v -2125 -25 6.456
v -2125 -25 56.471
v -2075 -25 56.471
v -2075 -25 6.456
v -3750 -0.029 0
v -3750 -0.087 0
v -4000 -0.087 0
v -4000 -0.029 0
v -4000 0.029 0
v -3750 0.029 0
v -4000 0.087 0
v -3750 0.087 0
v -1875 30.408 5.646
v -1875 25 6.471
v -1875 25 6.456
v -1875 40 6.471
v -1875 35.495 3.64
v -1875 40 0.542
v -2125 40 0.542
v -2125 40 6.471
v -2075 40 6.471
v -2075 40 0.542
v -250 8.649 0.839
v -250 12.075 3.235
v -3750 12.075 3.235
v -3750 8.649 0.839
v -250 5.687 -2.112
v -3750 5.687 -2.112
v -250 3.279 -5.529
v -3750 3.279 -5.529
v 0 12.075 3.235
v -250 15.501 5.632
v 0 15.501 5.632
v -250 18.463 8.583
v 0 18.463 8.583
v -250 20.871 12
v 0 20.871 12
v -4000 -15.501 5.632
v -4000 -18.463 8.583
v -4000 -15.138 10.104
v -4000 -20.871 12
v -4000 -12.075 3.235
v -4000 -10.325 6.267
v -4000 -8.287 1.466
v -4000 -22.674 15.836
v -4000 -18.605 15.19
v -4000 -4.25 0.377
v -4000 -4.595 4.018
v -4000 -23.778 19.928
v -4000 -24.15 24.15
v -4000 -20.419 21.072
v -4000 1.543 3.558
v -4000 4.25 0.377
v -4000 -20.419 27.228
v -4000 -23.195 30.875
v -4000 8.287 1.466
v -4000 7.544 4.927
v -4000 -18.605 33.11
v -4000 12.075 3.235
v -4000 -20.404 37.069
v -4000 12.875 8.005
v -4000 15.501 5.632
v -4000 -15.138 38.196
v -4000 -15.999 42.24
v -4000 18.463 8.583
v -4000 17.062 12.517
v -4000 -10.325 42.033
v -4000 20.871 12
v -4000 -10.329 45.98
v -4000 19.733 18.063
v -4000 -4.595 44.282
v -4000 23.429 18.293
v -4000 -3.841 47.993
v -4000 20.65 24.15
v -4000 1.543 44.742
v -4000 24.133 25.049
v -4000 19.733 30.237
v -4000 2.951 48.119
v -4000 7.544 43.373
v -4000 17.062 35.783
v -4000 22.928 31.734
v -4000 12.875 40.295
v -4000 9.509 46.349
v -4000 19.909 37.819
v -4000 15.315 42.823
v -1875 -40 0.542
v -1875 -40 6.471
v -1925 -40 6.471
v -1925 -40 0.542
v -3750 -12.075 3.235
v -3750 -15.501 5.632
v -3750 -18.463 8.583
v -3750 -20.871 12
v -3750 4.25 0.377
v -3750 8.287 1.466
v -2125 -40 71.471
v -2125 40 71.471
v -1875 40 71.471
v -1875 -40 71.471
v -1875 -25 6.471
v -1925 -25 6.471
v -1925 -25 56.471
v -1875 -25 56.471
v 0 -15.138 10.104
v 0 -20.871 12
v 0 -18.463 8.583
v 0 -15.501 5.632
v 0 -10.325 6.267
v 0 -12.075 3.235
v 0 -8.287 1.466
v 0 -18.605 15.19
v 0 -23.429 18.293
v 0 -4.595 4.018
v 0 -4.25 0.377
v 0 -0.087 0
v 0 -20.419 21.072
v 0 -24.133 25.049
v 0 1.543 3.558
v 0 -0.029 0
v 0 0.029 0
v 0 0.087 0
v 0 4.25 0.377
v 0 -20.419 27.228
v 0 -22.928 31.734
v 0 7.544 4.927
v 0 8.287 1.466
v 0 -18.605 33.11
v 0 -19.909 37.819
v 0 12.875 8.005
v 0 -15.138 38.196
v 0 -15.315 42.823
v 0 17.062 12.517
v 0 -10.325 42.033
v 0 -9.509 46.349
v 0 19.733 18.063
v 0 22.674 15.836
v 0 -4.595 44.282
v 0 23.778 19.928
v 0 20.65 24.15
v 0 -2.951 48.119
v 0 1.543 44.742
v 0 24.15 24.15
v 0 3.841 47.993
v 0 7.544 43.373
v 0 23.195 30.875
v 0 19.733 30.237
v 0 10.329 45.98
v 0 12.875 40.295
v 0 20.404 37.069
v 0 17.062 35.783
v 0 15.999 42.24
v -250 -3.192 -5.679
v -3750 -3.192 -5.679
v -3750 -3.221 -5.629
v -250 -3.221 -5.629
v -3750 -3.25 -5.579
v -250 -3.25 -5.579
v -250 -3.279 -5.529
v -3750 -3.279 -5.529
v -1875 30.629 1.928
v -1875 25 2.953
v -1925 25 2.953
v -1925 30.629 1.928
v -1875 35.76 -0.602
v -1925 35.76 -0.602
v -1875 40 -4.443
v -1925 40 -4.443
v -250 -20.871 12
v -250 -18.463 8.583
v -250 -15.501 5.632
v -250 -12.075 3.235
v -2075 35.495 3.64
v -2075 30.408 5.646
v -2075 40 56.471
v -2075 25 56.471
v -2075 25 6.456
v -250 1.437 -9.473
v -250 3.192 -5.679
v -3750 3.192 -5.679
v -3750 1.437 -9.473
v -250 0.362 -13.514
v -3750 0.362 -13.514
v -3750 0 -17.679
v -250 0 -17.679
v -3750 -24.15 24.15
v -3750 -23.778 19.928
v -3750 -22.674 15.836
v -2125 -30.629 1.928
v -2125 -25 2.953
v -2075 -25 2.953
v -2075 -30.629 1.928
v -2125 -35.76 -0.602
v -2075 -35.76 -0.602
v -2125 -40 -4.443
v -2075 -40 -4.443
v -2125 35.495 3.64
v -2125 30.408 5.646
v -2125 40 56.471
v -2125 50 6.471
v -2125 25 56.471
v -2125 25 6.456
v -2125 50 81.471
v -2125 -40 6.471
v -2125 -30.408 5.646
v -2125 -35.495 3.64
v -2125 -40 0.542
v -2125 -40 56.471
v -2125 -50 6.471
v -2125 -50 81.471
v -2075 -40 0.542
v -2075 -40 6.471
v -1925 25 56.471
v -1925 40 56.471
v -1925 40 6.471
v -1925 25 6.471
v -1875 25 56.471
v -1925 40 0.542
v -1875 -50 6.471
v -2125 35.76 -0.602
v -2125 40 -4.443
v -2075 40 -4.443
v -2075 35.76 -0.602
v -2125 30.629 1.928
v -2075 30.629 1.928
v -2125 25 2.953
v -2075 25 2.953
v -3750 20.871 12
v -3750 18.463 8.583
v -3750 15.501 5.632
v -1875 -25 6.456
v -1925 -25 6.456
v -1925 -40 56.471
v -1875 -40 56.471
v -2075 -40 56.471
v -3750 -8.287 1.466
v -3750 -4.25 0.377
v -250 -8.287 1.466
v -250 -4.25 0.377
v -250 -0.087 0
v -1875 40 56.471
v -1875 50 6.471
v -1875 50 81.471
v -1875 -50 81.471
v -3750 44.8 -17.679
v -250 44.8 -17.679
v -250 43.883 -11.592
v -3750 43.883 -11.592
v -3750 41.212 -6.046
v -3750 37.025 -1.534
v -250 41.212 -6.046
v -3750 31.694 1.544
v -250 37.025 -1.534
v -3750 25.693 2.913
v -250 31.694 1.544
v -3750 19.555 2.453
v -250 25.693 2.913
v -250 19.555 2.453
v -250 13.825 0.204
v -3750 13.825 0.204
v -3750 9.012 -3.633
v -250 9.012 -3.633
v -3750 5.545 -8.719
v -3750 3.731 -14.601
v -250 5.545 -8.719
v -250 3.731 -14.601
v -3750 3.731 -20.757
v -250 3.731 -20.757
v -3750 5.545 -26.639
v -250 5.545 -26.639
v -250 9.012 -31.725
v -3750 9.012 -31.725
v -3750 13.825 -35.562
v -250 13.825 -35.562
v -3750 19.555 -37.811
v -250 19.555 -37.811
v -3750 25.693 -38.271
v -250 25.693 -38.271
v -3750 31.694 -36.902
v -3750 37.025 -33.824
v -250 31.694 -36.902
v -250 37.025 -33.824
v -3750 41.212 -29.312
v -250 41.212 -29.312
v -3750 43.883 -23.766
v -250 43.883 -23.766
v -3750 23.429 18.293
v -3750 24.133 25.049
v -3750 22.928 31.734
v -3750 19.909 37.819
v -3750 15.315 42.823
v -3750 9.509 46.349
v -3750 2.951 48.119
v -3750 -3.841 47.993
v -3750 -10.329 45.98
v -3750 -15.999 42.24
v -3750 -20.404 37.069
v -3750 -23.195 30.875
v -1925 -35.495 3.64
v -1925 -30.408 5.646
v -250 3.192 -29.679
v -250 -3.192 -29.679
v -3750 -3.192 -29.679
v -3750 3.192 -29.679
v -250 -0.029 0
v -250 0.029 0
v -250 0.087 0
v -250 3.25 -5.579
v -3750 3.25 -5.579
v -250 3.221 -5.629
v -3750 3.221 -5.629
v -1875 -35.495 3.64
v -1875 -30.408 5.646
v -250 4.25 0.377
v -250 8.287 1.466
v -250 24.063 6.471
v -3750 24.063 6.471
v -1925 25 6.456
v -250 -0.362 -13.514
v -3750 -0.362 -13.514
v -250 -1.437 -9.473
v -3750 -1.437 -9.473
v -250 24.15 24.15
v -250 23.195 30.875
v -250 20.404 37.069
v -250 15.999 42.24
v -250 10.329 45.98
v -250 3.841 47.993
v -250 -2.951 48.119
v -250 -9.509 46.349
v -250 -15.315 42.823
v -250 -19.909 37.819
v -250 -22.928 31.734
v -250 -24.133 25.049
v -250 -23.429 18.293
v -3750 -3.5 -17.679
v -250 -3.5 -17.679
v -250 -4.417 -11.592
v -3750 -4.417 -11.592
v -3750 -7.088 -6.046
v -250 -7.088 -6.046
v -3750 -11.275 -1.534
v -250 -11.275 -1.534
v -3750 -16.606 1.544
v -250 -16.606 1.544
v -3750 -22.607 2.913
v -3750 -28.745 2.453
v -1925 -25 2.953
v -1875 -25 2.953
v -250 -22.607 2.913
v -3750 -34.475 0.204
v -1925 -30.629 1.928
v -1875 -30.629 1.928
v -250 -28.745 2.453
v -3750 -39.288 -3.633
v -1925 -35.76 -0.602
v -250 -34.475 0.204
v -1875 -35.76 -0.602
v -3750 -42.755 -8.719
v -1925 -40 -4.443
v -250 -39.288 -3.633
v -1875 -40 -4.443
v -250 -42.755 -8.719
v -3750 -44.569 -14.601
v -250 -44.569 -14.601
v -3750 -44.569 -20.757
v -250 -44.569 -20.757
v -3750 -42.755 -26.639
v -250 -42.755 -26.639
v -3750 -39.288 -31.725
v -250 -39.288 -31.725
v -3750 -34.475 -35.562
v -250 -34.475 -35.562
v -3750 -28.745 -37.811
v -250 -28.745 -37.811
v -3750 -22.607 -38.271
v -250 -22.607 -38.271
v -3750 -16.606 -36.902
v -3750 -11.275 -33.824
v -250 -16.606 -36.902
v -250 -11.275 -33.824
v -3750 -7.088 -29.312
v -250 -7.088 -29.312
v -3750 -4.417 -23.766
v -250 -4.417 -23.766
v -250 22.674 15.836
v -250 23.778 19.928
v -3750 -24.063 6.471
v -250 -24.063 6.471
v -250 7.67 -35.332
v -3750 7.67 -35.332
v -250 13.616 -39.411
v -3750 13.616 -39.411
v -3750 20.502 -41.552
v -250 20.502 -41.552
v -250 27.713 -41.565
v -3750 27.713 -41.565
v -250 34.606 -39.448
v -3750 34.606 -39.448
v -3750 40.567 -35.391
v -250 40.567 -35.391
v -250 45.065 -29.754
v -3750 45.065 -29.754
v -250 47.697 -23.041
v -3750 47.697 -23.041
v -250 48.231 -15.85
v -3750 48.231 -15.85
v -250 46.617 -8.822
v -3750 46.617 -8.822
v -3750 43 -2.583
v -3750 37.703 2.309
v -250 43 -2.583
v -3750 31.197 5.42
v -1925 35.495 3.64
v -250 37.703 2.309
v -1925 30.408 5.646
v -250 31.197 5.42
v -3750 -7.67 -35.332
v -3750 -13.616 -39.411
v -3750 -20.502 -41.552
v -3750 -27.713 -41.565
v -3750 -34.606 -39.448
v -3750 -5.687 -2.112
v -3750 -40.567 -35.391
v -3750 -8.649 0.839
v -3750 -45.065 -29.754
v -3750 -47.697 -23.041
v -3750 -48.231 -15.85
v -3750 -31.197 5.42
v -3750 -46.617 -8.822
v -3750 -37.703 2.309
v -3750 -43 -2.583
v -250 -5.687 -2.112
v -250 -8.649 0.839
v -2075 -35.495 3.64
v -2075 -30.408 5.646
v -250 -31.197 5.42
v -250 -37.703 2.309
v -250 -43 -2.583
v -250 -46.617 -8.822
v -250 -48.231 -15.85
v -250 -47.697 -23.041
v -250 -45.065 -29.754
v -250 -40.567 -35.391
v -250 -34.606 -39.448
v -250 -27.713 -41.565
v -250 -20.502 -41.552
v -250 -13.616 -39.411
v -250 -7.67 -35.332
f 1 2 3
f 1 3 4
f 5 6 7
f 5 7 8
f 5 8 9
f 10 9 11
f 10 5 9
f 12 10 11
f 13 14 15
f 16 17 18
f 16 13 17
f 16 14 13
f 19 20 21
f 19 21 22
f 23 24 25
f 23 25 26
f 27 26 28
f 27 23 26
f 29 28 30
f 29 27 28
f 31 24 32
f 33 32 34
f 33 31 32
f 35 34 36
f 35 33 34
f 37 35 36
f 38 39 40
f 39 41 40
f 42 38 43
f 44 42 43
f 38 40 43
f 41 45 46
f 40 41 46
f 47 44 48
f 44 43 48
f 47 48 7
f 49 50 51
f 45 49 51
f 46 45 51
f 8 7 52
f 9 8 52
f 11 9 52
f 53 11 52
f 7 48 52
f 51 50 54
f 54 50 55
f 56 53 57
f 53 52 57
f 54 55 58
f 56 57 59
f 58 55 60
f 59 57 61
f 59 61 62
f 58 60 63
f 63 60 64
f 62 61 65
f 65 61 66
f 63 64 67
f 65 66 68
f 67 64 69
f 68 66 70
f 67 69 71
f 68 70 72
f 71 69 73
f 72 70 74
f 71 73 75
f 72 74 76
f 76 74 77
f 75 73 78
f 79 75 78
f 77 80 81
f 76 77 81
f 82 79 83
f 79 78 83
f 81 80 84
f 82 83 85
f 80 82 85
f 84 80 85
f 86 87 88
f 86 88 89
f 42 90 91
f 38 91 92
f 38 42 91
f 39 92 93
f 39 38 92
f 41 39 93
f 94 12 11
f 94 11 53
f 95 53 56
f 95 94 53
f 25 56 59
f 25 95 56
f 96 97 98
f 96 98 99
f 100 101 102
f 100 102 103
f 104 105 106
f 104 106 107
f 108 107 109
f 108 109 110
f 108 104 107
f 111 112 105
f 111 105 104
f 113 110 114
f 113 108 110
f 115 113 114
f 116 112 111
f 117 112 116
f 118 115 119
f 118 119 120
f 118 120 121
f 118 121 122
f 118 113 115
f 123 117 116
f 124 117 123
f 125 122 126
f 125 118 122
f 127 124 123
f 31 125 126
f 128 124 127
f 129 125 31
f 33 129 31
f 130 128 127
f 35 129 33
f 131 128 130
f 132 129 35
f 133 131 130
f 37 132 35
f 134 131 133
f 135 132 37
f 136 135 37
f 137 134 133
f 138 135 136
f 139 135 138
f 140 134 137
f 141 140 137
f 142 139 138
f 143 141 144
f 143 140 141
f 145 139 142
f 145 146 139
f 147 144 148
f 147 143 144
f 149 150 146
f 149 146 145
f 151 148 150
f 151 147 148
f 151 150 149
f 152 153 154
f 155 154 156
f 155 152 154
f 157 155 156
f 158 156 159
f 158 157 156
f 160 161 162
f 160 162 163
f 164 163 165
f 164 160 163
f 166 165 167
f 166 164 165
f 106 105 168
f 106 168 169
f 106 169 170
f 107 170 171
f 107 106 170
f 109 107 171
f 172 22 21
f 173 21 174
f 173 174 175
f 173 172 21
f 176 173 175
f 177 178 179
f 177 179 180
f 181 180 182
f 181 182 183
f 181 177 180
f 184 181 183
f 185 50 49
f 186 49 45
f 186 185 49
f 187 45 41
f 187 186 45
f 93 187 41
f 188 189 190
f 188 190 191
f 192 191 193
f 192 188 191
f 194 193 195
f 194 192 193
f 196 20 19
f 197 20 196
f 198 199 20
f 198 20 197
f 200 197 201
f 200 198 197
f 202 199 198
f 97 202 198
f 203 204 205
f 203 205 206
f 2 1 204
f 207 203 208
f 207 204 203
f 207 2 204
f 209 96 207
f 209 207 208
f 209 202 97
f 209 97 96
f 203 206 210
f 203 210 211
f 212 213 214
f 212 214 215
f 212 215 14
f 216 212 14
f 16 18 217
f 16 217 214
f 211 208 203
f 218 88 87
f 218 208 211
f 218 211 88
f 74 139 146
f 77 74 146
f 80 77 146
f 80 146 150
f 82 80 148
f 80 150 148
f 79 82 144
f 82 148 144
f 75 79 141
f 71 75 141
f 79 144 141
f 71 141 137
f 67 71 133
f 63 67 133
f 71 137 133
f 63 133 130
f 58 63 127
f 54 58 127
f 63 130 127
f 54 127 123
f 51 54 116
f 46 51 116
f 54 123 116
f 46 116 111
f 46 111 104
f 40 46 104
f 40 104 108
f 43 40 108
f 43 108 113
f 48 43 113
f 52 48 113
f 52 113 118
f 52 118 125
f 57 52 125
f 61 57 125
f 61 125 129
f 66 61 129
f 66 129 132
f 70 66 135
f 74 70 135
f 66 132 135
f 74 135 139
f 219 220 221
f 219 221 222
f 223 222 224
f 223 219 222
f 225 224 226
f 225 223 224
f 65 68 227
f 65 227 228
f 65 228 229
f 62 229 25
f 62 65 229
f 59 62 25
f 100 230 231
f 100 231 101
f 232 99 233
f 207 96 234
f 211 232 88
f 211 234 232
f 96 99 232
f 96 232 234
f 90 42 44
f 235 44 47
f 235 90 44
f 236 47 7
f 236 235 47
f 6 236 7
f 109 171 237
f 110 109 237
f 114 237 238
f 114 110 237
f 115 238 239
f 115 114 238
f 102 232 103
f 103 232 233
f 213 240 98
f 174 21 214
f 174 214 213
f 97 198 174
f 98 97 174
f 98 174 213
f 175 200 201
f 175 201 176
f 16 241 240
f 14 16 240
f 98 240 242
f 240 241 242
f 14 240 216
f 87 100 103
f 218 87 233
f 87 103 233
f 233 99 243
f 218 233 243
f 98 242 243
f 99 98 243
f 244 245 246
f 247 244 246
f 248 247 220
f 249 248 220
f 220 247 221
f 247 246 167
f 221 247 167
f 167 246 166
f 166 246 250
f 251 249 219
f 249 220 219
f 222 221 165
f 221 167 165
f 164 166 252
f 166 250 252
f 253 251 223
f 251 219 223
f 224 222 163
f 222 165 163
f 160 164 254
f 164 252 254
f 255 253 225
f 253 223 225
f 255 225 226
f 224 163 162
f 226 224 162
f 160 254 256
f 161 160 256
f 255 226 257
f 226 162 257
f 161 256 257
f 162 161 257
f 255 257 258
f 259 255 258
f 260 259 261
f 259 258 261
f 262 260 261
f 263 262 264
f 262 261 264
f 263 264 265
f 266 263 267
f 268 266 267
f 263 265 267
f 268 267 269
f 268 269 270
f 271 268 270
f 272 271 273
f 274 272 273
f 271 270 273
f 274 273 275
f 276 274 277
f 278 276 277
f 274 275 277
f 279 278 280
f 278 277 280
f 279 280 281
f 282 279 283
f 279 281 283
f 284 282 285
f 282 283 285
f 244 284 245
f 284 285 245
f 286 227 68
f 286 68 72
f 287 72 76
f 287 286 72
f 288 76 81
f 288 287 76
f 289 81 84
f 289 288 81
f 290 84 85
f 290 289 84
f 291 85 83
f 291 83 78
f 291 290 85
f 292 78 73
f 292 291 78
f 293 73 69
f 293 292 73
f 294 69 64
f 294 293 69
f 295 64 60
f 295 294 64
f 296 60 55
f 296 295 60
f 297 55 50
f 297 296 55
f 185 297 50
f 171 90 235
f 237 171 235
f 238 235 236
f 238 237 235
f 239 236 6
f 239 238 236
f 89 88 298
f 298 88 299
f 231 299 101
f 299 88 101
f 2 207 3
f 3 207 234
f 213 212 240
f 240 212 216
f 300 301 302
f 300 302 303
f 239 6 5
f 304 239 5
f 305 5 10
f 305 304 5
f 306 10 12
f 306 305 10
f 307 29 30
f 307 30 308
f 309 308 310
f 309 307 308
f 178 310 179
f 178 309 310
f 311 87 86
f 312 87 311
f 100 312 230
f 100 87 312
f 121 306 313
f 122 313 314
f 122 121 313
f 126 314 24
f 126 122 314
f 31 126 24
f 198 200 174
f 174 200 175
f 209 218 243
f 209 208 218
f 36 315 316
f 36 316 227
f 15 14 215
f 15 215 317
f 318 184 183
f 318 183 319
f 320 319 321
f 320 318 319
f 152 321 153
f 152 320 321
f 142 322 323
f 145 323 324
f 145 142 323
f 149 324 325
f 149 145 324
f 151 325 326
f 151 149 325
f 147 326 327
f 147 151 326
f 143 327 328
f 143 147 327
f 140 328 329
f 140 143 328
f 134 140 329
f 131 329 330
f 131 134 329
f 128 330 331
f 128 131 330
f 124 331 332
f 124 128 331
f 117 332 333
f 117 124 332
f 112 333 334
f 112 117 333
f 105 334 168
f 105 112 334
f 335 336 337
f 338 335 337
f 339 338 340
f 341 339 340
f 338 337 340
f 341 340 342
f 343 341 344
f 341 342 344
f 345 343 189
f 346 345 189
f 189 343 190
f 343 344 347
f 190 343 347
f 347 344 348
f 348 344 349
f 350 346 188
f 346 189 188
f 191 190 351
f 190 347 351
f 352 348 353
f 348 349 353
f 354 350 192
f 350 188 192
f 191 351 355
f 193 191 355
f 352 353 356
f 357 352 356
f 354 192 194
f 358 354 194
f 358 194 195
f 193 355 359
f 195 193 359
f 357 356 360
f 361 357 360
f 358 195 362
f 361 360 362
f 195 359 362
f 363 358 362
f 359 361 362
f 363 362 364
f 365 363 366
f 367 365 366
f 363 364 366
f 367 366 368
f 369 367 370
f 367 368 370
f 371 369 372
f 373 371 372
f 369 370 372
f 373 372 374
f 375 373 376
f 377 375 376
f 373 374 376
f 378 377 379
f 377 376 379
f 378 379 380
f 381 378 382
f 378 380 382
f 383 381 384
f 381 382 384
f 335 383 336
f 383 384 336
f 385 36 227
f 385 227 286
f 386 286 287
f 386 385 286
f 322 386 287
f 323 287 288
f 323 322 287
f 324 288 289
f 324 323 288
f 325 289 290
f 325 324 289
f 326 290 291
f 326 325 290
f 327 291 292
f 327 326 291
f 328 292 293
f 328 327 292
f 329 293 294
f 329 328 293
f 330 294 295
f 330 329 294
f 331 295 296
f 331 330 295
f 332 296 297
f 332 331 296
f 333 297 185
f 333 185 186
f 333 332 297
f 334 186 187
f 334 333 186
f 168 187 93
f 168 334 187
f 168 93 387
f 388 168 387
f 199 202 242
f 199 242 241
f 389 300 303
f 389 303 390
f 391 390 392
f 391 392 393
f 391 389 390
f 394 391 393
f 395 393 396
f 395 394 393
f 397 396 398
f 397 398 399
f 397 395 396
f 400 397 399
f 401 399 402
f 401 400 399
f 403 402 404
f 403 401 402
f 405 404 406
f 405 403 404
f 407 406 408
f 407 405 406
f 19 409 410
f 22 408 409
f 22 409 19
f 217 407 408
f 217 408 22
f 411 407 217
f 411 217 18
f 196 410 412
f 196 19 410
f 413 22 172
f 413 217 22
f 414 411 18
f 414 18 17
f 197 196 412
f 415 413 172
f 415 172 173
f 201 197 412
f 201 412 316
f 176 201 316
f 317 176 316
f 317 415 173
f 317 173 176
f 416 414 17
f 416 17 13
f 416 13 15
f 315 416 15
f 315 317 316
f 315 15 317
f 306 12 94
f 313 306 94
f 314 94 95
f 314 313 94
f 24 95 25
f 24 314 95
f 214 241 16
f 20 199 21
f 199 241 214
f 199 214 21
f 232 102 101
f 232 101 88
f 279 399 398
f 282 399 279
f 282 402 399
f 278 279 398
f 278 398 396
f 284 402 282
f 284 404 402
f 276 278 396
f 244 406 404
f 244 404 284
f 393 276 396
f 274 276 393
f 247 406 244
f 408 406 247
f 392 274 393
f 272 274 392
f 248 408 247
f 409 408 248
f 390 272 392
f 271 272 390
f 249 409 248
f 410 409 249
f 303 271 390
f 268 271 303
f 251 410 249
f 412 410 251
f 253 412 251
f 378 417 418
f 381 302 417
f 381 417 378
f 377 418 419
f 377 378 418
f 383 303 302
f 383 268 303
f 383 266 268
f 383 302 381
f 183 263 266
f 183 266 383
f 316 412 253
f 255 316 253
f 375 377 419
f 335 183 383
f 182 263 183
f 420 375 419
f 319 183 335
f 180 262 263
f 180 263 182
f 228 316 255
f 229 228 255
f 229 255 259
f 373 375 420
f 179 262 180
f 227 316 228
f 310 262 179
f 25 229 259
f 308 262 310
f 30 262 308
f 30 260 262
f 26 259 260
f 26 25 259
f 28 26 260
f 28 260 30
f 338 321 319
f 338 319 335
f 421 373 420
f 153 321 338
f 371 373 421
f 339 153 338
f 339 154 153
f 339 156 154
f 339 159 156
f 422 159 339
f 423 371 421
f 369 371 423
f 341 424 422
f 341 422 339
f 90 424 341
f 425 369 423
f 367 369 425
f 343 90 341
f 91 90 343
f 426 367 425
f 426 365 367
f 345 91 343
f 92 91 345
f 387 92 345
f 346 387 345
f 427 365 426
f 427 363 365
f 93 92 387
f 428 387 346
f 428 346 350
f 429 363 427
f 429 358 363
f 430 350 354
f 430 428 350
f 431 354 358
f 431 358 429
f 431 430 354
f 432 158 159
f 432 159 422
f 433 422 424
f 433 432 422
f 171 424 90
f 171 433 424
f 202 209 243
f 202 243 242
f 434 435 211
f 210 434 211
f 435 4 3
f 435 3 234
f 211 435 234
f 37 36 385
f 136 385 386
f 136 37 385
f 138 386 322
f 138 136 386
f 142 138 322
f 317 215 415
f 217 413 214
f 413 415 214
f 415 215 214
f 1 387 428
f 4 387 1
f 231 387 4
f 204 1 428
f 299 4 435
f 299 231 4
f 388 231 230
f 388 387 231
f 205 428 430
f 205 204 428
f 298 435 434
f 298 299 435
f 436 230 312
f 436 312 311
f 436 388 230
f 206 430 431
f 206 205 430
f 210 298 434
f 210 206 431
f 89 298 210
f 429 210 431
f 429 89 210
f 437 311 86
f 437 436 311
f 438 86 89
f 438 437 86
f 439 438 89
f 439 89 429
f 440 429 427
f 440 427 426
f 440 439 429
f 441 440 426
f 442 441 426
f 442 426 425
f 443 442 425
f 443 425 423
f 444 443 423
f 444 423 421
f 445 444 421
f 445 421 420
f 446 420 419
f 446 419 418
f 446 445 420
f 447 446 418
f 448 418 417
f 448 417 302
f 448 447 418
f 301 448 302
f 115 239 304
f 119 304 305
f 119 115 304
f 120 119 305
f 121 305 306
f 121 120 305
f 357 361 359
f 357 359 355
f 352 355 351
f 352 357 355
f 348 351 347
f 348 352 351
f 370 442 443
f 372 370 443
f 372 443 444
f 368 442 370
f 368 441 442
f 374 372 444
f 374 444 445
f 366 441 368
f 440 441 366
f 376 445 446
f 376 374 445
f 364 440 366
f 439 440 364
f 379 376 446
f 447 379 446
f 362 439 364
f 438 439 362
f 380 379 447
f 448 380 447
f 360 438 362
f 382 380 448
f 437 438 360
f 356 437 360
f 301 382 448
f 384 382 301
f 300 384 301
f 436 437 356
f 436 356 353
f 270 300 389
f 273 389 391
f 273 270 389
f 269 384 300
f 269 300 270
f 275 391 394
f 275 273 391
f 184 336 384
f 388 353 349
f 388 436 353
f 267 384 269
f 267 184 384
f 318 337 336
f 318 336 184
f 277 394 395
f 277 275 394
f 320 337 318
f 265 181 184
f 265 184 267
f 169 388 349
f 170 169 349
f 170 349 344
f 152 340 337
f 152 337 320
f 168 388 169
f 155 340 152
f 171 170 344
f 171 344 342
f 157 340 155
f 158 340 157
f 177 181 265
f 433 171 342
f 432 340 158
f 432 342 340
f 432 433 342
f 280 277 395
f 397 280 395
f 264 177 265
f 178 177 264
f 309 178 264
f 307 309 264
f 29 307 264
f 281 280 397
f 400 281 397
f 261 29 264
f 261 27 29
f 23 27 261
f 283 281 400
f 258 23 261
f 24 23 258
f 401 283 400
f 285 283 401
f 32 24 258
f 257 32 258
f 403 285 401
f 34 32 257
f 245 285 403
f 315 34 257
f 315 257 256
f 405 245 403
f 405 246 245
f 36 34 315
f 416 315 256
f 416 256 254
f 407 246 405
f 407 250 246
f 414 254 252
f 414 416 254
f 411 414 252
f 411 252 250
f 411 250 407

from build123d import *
from build123d import SkipClean  # not in build123d's __all__

# Parameters (mm, degrees)
F0_R      = 20.65
F1_DEPTH  = 4000
F2_W      = 120.345171541
F2_H      = 96.7681743205
F2_R      = 24.15
F3_DEPTH  = 250
F4_W      = 149.252615869
F4_H      = 108.2491464913
F4_R      = 24.15
F5_DEPTH  = 250
F9_DEPTH  = 125
F10_W     = 50
F10_H     = 15
F11_DEPTH = 50
F13_DEPTH = 50
F15_DEPTH = 50


# Not quite as in the source:
# - after a boolean that leaves OpenCascade's solid faulty, fix() repairs it


with BuildPart() as f1:
    # F0 (on Right) → F1 (new body)
    with BuildSketch(Plane.YZ):
        with BuildLine():
            Line((-20.8711227654, 12.0001549593), (-24.0634869254, 6.4708180379))
            ThreePointArc((-24.0634869254, 6.4708180379), (-45.0645135014, -29.7540270028), (-3.19236416, -29.6790270028))
            Line((-3.19236416, -29.6790270028), (3.19236416, -29.6790270028))
            ThreePointArc((3.19236416, -29.6790270028), (45.0645135014, -29.7540270028), (24.0634869254, 6.4708180379))
            Line((24.0634869254, 6.4708180379), (20.8711227654, 12.0001549593))
            ThreePointArc((20.8711227654, 12.0001549593), (0, 48.3), (-20.8711227654, 12.0001549593))
        make_face()
        with Locations((-24.15, -17.6790270028)):
            Circle(F0_R, mode=Mode.SUBTRACT)
        with BuildLine():
            ThreePointArc((-12.075, 3.2354864986), (-6.2922525862, 0.8341243486), (-0.0865130746, 0.0001549593))
            ThreePointArc((-0.0865130746, 0.0001549593), (0, 0), (0.0865130746, 0.0001549593))
            ThreePointArc((0.0865130746, 0.0001549593), (6.2922525862, 0.8341243486), (12.075, 3.2354864986))
            ThreePointArc((12.075, 3.2354864986), (7.1039856675, -0.5718385904), (3.2788772346, -5.5291819621))
            ThreePointArc((3.2788772346, -5.5291819621), (3.2354864986, -5.6040270028), (3.19236416, -5.6790270028))
            ThreePointArc((3.19236416, -5.6790270028), (0.8117330813, -11.4703397637), (0, -17.6790270028))
            ThreePointArc((0, -17.6790270028), (-0.8117330813, -11.4703397637), (-3.19236416, -5.6790270028))
            ThreePointArc((-3.19236416, -5.6790270028), (-3.2354864986, -5.6040270028), (-3.2788772346, -5.5291819621))
            ThreePointArc((-3.2788772346, -5.5291819621), (-7.1039856675, -0.5718385904), (-12.075, 3.2354864986))
        make_face(mode=Mode.SUBTRACT)
        with Locations((24.15, -17.6790270028)):
            Circle(F0_R, mode=Mode.SUBTRACT)
        with Locations((0, 24.15)):
            Circle(F0_R, mode=Mode.SUBTRACT)
    extrude(amount=-F1_DEPTH)

    # F2 (on face) → F3 (cut)
    with BuildSketch(Plane(origin=(-4000, 0, 0), x_dir=(0, -1, 0), z_dir=(-1, 0, 0))):
        with Locations((-0.3221537918, 0.9117070585)):
            Rectangle(F2_W, F2_H)
        with Locations((0, 24.15)):
            Circle(F2_R, mode=Mode.SUBTRACT)
    with SkipClean():  # cleaning this boolean's faces spoils the solid; the shape is the same uncleaned
        extrude(amount=-F3_DEPTH, mode=Mode.SUBTRACT)

    # F4 (on face) → F5 (cut)
    with BuildSketch(Plane.YZ):
        with Locations((-4.9993358552, 3.1689684838)):
            Rectangle(F4_W, F4_H)
        with Locations((0, 24.15)):
            Circle(F4_R, mode=Mode.SUBTRACT)
    extrude(amount=-F5_DEPTH, mode=Mode.SUBTRACT)

    add(f1.part.fix(), mode=Mode.REPLACE)



with BuildPart() as f9:
    # F8 (on mid) → F9 (new body, symmetric)
    with BuildSketch(Plane(origin=(-2000, 0, 0), x_dir=(0, -1, 0), z_dir=(-1, 0, 0))):
        Polygon((50, 6.4708180379), (50, 81.4708180379), (-50, 81.4708180379), (-50, 6.4708180379), (-40, 6.4708180379), (-40, 71.4708180379), (40, 71.4708180379), (40, 6.4708180379), align=None)
    extrude(amount=F9_DEPTH, both=True)

    # F10 (on face) → F11 (join)
    with BuildSketch(Plane(origin=(0, 0, 6.4708180379), x_dir=(1, 0, 0), z_dir=(0, 0, -1))):
        with Locations((-2100, 32.5)):
            Rectangle(F10_W, F10_H)
        with Locations((-1900, 32.5)):
            Rectangle(F10_W, F10_H)
        with Locations((-1900, -32.5)):
            Rectangle(F10_W, F10_H)
        with Locations((-2100, -32.5)):
            Rectangle(F10_W, F10_H)
    extrude(amount=-F11_DEPTH)


with BuildPart() as f1_1:
    add(f1.part, clean=False)

    add(f9.part)  # F13 merges F9
    # F12 (on face) → F13 (join, through all)
    with BuildSketch(Plane(origin=(-2125, 0, 0), x_dir=(0, -1, 0), z_dir=(-1, 0, 0))):
        with BuildLine():
            Line((40, 6.4708180379), (25, 6.4708180379))
            Line((25, 6.4708180379), (25, 2.9534716341))
            ThreePointArc((25, 2.9534716341), (33.282271785, 0.8418831272), (40, -4.4427133166))
            Line((40, -4.4427133166), (40, 6.4708180379))
        make_face()
        with BuildLine():
            Line((-25, 6.4708180379), (-40, 6.4708180379))
            Line((-40, 6.4708180379), (-40, -4.4427133166))
            ThreePointArc((-40, -4.4427133166), (-33.282271785, 0.8418831272), (-25, 2.9534716341))
            Line((-25, 2.9534716341), (-25, 6.4708180379))
        make_face()
    extrude(amount=-F13_DEPTH)

    # F14 (on face) → F15 (join, through all)
    with BuildSketch(Plane.YZ.offset(-1875)):
        with BuildLine():
            Line((40, -4.4427133166), (40, 6.4708180379))
            Line((40, 6.4708180379), (25, 6.4708180379))
            Line((25, 6.4708180379), (25, 2.9534716341))
            ThreePointArc((25, 2.9534716341), (33.282271785, 0.8418831272), (40, -4.4427133166))
        make_face()
        with BuildLine():
            Line((-25, 6.4708180379), (-40, 6.4708180379))
            Line((-40, 6.4708180379), (-40, -4.4427133166))
            ThreePointArc((-40, -4.4427133166), (-33.282271785, 0.8418831272), (-25, 2.9534716341))
            Line((-25, 2.9534716341), (-25, 6.4708180379))
        make_face()
    extrude(amount=-F15_DEPTH)


solid = f1_1.part
